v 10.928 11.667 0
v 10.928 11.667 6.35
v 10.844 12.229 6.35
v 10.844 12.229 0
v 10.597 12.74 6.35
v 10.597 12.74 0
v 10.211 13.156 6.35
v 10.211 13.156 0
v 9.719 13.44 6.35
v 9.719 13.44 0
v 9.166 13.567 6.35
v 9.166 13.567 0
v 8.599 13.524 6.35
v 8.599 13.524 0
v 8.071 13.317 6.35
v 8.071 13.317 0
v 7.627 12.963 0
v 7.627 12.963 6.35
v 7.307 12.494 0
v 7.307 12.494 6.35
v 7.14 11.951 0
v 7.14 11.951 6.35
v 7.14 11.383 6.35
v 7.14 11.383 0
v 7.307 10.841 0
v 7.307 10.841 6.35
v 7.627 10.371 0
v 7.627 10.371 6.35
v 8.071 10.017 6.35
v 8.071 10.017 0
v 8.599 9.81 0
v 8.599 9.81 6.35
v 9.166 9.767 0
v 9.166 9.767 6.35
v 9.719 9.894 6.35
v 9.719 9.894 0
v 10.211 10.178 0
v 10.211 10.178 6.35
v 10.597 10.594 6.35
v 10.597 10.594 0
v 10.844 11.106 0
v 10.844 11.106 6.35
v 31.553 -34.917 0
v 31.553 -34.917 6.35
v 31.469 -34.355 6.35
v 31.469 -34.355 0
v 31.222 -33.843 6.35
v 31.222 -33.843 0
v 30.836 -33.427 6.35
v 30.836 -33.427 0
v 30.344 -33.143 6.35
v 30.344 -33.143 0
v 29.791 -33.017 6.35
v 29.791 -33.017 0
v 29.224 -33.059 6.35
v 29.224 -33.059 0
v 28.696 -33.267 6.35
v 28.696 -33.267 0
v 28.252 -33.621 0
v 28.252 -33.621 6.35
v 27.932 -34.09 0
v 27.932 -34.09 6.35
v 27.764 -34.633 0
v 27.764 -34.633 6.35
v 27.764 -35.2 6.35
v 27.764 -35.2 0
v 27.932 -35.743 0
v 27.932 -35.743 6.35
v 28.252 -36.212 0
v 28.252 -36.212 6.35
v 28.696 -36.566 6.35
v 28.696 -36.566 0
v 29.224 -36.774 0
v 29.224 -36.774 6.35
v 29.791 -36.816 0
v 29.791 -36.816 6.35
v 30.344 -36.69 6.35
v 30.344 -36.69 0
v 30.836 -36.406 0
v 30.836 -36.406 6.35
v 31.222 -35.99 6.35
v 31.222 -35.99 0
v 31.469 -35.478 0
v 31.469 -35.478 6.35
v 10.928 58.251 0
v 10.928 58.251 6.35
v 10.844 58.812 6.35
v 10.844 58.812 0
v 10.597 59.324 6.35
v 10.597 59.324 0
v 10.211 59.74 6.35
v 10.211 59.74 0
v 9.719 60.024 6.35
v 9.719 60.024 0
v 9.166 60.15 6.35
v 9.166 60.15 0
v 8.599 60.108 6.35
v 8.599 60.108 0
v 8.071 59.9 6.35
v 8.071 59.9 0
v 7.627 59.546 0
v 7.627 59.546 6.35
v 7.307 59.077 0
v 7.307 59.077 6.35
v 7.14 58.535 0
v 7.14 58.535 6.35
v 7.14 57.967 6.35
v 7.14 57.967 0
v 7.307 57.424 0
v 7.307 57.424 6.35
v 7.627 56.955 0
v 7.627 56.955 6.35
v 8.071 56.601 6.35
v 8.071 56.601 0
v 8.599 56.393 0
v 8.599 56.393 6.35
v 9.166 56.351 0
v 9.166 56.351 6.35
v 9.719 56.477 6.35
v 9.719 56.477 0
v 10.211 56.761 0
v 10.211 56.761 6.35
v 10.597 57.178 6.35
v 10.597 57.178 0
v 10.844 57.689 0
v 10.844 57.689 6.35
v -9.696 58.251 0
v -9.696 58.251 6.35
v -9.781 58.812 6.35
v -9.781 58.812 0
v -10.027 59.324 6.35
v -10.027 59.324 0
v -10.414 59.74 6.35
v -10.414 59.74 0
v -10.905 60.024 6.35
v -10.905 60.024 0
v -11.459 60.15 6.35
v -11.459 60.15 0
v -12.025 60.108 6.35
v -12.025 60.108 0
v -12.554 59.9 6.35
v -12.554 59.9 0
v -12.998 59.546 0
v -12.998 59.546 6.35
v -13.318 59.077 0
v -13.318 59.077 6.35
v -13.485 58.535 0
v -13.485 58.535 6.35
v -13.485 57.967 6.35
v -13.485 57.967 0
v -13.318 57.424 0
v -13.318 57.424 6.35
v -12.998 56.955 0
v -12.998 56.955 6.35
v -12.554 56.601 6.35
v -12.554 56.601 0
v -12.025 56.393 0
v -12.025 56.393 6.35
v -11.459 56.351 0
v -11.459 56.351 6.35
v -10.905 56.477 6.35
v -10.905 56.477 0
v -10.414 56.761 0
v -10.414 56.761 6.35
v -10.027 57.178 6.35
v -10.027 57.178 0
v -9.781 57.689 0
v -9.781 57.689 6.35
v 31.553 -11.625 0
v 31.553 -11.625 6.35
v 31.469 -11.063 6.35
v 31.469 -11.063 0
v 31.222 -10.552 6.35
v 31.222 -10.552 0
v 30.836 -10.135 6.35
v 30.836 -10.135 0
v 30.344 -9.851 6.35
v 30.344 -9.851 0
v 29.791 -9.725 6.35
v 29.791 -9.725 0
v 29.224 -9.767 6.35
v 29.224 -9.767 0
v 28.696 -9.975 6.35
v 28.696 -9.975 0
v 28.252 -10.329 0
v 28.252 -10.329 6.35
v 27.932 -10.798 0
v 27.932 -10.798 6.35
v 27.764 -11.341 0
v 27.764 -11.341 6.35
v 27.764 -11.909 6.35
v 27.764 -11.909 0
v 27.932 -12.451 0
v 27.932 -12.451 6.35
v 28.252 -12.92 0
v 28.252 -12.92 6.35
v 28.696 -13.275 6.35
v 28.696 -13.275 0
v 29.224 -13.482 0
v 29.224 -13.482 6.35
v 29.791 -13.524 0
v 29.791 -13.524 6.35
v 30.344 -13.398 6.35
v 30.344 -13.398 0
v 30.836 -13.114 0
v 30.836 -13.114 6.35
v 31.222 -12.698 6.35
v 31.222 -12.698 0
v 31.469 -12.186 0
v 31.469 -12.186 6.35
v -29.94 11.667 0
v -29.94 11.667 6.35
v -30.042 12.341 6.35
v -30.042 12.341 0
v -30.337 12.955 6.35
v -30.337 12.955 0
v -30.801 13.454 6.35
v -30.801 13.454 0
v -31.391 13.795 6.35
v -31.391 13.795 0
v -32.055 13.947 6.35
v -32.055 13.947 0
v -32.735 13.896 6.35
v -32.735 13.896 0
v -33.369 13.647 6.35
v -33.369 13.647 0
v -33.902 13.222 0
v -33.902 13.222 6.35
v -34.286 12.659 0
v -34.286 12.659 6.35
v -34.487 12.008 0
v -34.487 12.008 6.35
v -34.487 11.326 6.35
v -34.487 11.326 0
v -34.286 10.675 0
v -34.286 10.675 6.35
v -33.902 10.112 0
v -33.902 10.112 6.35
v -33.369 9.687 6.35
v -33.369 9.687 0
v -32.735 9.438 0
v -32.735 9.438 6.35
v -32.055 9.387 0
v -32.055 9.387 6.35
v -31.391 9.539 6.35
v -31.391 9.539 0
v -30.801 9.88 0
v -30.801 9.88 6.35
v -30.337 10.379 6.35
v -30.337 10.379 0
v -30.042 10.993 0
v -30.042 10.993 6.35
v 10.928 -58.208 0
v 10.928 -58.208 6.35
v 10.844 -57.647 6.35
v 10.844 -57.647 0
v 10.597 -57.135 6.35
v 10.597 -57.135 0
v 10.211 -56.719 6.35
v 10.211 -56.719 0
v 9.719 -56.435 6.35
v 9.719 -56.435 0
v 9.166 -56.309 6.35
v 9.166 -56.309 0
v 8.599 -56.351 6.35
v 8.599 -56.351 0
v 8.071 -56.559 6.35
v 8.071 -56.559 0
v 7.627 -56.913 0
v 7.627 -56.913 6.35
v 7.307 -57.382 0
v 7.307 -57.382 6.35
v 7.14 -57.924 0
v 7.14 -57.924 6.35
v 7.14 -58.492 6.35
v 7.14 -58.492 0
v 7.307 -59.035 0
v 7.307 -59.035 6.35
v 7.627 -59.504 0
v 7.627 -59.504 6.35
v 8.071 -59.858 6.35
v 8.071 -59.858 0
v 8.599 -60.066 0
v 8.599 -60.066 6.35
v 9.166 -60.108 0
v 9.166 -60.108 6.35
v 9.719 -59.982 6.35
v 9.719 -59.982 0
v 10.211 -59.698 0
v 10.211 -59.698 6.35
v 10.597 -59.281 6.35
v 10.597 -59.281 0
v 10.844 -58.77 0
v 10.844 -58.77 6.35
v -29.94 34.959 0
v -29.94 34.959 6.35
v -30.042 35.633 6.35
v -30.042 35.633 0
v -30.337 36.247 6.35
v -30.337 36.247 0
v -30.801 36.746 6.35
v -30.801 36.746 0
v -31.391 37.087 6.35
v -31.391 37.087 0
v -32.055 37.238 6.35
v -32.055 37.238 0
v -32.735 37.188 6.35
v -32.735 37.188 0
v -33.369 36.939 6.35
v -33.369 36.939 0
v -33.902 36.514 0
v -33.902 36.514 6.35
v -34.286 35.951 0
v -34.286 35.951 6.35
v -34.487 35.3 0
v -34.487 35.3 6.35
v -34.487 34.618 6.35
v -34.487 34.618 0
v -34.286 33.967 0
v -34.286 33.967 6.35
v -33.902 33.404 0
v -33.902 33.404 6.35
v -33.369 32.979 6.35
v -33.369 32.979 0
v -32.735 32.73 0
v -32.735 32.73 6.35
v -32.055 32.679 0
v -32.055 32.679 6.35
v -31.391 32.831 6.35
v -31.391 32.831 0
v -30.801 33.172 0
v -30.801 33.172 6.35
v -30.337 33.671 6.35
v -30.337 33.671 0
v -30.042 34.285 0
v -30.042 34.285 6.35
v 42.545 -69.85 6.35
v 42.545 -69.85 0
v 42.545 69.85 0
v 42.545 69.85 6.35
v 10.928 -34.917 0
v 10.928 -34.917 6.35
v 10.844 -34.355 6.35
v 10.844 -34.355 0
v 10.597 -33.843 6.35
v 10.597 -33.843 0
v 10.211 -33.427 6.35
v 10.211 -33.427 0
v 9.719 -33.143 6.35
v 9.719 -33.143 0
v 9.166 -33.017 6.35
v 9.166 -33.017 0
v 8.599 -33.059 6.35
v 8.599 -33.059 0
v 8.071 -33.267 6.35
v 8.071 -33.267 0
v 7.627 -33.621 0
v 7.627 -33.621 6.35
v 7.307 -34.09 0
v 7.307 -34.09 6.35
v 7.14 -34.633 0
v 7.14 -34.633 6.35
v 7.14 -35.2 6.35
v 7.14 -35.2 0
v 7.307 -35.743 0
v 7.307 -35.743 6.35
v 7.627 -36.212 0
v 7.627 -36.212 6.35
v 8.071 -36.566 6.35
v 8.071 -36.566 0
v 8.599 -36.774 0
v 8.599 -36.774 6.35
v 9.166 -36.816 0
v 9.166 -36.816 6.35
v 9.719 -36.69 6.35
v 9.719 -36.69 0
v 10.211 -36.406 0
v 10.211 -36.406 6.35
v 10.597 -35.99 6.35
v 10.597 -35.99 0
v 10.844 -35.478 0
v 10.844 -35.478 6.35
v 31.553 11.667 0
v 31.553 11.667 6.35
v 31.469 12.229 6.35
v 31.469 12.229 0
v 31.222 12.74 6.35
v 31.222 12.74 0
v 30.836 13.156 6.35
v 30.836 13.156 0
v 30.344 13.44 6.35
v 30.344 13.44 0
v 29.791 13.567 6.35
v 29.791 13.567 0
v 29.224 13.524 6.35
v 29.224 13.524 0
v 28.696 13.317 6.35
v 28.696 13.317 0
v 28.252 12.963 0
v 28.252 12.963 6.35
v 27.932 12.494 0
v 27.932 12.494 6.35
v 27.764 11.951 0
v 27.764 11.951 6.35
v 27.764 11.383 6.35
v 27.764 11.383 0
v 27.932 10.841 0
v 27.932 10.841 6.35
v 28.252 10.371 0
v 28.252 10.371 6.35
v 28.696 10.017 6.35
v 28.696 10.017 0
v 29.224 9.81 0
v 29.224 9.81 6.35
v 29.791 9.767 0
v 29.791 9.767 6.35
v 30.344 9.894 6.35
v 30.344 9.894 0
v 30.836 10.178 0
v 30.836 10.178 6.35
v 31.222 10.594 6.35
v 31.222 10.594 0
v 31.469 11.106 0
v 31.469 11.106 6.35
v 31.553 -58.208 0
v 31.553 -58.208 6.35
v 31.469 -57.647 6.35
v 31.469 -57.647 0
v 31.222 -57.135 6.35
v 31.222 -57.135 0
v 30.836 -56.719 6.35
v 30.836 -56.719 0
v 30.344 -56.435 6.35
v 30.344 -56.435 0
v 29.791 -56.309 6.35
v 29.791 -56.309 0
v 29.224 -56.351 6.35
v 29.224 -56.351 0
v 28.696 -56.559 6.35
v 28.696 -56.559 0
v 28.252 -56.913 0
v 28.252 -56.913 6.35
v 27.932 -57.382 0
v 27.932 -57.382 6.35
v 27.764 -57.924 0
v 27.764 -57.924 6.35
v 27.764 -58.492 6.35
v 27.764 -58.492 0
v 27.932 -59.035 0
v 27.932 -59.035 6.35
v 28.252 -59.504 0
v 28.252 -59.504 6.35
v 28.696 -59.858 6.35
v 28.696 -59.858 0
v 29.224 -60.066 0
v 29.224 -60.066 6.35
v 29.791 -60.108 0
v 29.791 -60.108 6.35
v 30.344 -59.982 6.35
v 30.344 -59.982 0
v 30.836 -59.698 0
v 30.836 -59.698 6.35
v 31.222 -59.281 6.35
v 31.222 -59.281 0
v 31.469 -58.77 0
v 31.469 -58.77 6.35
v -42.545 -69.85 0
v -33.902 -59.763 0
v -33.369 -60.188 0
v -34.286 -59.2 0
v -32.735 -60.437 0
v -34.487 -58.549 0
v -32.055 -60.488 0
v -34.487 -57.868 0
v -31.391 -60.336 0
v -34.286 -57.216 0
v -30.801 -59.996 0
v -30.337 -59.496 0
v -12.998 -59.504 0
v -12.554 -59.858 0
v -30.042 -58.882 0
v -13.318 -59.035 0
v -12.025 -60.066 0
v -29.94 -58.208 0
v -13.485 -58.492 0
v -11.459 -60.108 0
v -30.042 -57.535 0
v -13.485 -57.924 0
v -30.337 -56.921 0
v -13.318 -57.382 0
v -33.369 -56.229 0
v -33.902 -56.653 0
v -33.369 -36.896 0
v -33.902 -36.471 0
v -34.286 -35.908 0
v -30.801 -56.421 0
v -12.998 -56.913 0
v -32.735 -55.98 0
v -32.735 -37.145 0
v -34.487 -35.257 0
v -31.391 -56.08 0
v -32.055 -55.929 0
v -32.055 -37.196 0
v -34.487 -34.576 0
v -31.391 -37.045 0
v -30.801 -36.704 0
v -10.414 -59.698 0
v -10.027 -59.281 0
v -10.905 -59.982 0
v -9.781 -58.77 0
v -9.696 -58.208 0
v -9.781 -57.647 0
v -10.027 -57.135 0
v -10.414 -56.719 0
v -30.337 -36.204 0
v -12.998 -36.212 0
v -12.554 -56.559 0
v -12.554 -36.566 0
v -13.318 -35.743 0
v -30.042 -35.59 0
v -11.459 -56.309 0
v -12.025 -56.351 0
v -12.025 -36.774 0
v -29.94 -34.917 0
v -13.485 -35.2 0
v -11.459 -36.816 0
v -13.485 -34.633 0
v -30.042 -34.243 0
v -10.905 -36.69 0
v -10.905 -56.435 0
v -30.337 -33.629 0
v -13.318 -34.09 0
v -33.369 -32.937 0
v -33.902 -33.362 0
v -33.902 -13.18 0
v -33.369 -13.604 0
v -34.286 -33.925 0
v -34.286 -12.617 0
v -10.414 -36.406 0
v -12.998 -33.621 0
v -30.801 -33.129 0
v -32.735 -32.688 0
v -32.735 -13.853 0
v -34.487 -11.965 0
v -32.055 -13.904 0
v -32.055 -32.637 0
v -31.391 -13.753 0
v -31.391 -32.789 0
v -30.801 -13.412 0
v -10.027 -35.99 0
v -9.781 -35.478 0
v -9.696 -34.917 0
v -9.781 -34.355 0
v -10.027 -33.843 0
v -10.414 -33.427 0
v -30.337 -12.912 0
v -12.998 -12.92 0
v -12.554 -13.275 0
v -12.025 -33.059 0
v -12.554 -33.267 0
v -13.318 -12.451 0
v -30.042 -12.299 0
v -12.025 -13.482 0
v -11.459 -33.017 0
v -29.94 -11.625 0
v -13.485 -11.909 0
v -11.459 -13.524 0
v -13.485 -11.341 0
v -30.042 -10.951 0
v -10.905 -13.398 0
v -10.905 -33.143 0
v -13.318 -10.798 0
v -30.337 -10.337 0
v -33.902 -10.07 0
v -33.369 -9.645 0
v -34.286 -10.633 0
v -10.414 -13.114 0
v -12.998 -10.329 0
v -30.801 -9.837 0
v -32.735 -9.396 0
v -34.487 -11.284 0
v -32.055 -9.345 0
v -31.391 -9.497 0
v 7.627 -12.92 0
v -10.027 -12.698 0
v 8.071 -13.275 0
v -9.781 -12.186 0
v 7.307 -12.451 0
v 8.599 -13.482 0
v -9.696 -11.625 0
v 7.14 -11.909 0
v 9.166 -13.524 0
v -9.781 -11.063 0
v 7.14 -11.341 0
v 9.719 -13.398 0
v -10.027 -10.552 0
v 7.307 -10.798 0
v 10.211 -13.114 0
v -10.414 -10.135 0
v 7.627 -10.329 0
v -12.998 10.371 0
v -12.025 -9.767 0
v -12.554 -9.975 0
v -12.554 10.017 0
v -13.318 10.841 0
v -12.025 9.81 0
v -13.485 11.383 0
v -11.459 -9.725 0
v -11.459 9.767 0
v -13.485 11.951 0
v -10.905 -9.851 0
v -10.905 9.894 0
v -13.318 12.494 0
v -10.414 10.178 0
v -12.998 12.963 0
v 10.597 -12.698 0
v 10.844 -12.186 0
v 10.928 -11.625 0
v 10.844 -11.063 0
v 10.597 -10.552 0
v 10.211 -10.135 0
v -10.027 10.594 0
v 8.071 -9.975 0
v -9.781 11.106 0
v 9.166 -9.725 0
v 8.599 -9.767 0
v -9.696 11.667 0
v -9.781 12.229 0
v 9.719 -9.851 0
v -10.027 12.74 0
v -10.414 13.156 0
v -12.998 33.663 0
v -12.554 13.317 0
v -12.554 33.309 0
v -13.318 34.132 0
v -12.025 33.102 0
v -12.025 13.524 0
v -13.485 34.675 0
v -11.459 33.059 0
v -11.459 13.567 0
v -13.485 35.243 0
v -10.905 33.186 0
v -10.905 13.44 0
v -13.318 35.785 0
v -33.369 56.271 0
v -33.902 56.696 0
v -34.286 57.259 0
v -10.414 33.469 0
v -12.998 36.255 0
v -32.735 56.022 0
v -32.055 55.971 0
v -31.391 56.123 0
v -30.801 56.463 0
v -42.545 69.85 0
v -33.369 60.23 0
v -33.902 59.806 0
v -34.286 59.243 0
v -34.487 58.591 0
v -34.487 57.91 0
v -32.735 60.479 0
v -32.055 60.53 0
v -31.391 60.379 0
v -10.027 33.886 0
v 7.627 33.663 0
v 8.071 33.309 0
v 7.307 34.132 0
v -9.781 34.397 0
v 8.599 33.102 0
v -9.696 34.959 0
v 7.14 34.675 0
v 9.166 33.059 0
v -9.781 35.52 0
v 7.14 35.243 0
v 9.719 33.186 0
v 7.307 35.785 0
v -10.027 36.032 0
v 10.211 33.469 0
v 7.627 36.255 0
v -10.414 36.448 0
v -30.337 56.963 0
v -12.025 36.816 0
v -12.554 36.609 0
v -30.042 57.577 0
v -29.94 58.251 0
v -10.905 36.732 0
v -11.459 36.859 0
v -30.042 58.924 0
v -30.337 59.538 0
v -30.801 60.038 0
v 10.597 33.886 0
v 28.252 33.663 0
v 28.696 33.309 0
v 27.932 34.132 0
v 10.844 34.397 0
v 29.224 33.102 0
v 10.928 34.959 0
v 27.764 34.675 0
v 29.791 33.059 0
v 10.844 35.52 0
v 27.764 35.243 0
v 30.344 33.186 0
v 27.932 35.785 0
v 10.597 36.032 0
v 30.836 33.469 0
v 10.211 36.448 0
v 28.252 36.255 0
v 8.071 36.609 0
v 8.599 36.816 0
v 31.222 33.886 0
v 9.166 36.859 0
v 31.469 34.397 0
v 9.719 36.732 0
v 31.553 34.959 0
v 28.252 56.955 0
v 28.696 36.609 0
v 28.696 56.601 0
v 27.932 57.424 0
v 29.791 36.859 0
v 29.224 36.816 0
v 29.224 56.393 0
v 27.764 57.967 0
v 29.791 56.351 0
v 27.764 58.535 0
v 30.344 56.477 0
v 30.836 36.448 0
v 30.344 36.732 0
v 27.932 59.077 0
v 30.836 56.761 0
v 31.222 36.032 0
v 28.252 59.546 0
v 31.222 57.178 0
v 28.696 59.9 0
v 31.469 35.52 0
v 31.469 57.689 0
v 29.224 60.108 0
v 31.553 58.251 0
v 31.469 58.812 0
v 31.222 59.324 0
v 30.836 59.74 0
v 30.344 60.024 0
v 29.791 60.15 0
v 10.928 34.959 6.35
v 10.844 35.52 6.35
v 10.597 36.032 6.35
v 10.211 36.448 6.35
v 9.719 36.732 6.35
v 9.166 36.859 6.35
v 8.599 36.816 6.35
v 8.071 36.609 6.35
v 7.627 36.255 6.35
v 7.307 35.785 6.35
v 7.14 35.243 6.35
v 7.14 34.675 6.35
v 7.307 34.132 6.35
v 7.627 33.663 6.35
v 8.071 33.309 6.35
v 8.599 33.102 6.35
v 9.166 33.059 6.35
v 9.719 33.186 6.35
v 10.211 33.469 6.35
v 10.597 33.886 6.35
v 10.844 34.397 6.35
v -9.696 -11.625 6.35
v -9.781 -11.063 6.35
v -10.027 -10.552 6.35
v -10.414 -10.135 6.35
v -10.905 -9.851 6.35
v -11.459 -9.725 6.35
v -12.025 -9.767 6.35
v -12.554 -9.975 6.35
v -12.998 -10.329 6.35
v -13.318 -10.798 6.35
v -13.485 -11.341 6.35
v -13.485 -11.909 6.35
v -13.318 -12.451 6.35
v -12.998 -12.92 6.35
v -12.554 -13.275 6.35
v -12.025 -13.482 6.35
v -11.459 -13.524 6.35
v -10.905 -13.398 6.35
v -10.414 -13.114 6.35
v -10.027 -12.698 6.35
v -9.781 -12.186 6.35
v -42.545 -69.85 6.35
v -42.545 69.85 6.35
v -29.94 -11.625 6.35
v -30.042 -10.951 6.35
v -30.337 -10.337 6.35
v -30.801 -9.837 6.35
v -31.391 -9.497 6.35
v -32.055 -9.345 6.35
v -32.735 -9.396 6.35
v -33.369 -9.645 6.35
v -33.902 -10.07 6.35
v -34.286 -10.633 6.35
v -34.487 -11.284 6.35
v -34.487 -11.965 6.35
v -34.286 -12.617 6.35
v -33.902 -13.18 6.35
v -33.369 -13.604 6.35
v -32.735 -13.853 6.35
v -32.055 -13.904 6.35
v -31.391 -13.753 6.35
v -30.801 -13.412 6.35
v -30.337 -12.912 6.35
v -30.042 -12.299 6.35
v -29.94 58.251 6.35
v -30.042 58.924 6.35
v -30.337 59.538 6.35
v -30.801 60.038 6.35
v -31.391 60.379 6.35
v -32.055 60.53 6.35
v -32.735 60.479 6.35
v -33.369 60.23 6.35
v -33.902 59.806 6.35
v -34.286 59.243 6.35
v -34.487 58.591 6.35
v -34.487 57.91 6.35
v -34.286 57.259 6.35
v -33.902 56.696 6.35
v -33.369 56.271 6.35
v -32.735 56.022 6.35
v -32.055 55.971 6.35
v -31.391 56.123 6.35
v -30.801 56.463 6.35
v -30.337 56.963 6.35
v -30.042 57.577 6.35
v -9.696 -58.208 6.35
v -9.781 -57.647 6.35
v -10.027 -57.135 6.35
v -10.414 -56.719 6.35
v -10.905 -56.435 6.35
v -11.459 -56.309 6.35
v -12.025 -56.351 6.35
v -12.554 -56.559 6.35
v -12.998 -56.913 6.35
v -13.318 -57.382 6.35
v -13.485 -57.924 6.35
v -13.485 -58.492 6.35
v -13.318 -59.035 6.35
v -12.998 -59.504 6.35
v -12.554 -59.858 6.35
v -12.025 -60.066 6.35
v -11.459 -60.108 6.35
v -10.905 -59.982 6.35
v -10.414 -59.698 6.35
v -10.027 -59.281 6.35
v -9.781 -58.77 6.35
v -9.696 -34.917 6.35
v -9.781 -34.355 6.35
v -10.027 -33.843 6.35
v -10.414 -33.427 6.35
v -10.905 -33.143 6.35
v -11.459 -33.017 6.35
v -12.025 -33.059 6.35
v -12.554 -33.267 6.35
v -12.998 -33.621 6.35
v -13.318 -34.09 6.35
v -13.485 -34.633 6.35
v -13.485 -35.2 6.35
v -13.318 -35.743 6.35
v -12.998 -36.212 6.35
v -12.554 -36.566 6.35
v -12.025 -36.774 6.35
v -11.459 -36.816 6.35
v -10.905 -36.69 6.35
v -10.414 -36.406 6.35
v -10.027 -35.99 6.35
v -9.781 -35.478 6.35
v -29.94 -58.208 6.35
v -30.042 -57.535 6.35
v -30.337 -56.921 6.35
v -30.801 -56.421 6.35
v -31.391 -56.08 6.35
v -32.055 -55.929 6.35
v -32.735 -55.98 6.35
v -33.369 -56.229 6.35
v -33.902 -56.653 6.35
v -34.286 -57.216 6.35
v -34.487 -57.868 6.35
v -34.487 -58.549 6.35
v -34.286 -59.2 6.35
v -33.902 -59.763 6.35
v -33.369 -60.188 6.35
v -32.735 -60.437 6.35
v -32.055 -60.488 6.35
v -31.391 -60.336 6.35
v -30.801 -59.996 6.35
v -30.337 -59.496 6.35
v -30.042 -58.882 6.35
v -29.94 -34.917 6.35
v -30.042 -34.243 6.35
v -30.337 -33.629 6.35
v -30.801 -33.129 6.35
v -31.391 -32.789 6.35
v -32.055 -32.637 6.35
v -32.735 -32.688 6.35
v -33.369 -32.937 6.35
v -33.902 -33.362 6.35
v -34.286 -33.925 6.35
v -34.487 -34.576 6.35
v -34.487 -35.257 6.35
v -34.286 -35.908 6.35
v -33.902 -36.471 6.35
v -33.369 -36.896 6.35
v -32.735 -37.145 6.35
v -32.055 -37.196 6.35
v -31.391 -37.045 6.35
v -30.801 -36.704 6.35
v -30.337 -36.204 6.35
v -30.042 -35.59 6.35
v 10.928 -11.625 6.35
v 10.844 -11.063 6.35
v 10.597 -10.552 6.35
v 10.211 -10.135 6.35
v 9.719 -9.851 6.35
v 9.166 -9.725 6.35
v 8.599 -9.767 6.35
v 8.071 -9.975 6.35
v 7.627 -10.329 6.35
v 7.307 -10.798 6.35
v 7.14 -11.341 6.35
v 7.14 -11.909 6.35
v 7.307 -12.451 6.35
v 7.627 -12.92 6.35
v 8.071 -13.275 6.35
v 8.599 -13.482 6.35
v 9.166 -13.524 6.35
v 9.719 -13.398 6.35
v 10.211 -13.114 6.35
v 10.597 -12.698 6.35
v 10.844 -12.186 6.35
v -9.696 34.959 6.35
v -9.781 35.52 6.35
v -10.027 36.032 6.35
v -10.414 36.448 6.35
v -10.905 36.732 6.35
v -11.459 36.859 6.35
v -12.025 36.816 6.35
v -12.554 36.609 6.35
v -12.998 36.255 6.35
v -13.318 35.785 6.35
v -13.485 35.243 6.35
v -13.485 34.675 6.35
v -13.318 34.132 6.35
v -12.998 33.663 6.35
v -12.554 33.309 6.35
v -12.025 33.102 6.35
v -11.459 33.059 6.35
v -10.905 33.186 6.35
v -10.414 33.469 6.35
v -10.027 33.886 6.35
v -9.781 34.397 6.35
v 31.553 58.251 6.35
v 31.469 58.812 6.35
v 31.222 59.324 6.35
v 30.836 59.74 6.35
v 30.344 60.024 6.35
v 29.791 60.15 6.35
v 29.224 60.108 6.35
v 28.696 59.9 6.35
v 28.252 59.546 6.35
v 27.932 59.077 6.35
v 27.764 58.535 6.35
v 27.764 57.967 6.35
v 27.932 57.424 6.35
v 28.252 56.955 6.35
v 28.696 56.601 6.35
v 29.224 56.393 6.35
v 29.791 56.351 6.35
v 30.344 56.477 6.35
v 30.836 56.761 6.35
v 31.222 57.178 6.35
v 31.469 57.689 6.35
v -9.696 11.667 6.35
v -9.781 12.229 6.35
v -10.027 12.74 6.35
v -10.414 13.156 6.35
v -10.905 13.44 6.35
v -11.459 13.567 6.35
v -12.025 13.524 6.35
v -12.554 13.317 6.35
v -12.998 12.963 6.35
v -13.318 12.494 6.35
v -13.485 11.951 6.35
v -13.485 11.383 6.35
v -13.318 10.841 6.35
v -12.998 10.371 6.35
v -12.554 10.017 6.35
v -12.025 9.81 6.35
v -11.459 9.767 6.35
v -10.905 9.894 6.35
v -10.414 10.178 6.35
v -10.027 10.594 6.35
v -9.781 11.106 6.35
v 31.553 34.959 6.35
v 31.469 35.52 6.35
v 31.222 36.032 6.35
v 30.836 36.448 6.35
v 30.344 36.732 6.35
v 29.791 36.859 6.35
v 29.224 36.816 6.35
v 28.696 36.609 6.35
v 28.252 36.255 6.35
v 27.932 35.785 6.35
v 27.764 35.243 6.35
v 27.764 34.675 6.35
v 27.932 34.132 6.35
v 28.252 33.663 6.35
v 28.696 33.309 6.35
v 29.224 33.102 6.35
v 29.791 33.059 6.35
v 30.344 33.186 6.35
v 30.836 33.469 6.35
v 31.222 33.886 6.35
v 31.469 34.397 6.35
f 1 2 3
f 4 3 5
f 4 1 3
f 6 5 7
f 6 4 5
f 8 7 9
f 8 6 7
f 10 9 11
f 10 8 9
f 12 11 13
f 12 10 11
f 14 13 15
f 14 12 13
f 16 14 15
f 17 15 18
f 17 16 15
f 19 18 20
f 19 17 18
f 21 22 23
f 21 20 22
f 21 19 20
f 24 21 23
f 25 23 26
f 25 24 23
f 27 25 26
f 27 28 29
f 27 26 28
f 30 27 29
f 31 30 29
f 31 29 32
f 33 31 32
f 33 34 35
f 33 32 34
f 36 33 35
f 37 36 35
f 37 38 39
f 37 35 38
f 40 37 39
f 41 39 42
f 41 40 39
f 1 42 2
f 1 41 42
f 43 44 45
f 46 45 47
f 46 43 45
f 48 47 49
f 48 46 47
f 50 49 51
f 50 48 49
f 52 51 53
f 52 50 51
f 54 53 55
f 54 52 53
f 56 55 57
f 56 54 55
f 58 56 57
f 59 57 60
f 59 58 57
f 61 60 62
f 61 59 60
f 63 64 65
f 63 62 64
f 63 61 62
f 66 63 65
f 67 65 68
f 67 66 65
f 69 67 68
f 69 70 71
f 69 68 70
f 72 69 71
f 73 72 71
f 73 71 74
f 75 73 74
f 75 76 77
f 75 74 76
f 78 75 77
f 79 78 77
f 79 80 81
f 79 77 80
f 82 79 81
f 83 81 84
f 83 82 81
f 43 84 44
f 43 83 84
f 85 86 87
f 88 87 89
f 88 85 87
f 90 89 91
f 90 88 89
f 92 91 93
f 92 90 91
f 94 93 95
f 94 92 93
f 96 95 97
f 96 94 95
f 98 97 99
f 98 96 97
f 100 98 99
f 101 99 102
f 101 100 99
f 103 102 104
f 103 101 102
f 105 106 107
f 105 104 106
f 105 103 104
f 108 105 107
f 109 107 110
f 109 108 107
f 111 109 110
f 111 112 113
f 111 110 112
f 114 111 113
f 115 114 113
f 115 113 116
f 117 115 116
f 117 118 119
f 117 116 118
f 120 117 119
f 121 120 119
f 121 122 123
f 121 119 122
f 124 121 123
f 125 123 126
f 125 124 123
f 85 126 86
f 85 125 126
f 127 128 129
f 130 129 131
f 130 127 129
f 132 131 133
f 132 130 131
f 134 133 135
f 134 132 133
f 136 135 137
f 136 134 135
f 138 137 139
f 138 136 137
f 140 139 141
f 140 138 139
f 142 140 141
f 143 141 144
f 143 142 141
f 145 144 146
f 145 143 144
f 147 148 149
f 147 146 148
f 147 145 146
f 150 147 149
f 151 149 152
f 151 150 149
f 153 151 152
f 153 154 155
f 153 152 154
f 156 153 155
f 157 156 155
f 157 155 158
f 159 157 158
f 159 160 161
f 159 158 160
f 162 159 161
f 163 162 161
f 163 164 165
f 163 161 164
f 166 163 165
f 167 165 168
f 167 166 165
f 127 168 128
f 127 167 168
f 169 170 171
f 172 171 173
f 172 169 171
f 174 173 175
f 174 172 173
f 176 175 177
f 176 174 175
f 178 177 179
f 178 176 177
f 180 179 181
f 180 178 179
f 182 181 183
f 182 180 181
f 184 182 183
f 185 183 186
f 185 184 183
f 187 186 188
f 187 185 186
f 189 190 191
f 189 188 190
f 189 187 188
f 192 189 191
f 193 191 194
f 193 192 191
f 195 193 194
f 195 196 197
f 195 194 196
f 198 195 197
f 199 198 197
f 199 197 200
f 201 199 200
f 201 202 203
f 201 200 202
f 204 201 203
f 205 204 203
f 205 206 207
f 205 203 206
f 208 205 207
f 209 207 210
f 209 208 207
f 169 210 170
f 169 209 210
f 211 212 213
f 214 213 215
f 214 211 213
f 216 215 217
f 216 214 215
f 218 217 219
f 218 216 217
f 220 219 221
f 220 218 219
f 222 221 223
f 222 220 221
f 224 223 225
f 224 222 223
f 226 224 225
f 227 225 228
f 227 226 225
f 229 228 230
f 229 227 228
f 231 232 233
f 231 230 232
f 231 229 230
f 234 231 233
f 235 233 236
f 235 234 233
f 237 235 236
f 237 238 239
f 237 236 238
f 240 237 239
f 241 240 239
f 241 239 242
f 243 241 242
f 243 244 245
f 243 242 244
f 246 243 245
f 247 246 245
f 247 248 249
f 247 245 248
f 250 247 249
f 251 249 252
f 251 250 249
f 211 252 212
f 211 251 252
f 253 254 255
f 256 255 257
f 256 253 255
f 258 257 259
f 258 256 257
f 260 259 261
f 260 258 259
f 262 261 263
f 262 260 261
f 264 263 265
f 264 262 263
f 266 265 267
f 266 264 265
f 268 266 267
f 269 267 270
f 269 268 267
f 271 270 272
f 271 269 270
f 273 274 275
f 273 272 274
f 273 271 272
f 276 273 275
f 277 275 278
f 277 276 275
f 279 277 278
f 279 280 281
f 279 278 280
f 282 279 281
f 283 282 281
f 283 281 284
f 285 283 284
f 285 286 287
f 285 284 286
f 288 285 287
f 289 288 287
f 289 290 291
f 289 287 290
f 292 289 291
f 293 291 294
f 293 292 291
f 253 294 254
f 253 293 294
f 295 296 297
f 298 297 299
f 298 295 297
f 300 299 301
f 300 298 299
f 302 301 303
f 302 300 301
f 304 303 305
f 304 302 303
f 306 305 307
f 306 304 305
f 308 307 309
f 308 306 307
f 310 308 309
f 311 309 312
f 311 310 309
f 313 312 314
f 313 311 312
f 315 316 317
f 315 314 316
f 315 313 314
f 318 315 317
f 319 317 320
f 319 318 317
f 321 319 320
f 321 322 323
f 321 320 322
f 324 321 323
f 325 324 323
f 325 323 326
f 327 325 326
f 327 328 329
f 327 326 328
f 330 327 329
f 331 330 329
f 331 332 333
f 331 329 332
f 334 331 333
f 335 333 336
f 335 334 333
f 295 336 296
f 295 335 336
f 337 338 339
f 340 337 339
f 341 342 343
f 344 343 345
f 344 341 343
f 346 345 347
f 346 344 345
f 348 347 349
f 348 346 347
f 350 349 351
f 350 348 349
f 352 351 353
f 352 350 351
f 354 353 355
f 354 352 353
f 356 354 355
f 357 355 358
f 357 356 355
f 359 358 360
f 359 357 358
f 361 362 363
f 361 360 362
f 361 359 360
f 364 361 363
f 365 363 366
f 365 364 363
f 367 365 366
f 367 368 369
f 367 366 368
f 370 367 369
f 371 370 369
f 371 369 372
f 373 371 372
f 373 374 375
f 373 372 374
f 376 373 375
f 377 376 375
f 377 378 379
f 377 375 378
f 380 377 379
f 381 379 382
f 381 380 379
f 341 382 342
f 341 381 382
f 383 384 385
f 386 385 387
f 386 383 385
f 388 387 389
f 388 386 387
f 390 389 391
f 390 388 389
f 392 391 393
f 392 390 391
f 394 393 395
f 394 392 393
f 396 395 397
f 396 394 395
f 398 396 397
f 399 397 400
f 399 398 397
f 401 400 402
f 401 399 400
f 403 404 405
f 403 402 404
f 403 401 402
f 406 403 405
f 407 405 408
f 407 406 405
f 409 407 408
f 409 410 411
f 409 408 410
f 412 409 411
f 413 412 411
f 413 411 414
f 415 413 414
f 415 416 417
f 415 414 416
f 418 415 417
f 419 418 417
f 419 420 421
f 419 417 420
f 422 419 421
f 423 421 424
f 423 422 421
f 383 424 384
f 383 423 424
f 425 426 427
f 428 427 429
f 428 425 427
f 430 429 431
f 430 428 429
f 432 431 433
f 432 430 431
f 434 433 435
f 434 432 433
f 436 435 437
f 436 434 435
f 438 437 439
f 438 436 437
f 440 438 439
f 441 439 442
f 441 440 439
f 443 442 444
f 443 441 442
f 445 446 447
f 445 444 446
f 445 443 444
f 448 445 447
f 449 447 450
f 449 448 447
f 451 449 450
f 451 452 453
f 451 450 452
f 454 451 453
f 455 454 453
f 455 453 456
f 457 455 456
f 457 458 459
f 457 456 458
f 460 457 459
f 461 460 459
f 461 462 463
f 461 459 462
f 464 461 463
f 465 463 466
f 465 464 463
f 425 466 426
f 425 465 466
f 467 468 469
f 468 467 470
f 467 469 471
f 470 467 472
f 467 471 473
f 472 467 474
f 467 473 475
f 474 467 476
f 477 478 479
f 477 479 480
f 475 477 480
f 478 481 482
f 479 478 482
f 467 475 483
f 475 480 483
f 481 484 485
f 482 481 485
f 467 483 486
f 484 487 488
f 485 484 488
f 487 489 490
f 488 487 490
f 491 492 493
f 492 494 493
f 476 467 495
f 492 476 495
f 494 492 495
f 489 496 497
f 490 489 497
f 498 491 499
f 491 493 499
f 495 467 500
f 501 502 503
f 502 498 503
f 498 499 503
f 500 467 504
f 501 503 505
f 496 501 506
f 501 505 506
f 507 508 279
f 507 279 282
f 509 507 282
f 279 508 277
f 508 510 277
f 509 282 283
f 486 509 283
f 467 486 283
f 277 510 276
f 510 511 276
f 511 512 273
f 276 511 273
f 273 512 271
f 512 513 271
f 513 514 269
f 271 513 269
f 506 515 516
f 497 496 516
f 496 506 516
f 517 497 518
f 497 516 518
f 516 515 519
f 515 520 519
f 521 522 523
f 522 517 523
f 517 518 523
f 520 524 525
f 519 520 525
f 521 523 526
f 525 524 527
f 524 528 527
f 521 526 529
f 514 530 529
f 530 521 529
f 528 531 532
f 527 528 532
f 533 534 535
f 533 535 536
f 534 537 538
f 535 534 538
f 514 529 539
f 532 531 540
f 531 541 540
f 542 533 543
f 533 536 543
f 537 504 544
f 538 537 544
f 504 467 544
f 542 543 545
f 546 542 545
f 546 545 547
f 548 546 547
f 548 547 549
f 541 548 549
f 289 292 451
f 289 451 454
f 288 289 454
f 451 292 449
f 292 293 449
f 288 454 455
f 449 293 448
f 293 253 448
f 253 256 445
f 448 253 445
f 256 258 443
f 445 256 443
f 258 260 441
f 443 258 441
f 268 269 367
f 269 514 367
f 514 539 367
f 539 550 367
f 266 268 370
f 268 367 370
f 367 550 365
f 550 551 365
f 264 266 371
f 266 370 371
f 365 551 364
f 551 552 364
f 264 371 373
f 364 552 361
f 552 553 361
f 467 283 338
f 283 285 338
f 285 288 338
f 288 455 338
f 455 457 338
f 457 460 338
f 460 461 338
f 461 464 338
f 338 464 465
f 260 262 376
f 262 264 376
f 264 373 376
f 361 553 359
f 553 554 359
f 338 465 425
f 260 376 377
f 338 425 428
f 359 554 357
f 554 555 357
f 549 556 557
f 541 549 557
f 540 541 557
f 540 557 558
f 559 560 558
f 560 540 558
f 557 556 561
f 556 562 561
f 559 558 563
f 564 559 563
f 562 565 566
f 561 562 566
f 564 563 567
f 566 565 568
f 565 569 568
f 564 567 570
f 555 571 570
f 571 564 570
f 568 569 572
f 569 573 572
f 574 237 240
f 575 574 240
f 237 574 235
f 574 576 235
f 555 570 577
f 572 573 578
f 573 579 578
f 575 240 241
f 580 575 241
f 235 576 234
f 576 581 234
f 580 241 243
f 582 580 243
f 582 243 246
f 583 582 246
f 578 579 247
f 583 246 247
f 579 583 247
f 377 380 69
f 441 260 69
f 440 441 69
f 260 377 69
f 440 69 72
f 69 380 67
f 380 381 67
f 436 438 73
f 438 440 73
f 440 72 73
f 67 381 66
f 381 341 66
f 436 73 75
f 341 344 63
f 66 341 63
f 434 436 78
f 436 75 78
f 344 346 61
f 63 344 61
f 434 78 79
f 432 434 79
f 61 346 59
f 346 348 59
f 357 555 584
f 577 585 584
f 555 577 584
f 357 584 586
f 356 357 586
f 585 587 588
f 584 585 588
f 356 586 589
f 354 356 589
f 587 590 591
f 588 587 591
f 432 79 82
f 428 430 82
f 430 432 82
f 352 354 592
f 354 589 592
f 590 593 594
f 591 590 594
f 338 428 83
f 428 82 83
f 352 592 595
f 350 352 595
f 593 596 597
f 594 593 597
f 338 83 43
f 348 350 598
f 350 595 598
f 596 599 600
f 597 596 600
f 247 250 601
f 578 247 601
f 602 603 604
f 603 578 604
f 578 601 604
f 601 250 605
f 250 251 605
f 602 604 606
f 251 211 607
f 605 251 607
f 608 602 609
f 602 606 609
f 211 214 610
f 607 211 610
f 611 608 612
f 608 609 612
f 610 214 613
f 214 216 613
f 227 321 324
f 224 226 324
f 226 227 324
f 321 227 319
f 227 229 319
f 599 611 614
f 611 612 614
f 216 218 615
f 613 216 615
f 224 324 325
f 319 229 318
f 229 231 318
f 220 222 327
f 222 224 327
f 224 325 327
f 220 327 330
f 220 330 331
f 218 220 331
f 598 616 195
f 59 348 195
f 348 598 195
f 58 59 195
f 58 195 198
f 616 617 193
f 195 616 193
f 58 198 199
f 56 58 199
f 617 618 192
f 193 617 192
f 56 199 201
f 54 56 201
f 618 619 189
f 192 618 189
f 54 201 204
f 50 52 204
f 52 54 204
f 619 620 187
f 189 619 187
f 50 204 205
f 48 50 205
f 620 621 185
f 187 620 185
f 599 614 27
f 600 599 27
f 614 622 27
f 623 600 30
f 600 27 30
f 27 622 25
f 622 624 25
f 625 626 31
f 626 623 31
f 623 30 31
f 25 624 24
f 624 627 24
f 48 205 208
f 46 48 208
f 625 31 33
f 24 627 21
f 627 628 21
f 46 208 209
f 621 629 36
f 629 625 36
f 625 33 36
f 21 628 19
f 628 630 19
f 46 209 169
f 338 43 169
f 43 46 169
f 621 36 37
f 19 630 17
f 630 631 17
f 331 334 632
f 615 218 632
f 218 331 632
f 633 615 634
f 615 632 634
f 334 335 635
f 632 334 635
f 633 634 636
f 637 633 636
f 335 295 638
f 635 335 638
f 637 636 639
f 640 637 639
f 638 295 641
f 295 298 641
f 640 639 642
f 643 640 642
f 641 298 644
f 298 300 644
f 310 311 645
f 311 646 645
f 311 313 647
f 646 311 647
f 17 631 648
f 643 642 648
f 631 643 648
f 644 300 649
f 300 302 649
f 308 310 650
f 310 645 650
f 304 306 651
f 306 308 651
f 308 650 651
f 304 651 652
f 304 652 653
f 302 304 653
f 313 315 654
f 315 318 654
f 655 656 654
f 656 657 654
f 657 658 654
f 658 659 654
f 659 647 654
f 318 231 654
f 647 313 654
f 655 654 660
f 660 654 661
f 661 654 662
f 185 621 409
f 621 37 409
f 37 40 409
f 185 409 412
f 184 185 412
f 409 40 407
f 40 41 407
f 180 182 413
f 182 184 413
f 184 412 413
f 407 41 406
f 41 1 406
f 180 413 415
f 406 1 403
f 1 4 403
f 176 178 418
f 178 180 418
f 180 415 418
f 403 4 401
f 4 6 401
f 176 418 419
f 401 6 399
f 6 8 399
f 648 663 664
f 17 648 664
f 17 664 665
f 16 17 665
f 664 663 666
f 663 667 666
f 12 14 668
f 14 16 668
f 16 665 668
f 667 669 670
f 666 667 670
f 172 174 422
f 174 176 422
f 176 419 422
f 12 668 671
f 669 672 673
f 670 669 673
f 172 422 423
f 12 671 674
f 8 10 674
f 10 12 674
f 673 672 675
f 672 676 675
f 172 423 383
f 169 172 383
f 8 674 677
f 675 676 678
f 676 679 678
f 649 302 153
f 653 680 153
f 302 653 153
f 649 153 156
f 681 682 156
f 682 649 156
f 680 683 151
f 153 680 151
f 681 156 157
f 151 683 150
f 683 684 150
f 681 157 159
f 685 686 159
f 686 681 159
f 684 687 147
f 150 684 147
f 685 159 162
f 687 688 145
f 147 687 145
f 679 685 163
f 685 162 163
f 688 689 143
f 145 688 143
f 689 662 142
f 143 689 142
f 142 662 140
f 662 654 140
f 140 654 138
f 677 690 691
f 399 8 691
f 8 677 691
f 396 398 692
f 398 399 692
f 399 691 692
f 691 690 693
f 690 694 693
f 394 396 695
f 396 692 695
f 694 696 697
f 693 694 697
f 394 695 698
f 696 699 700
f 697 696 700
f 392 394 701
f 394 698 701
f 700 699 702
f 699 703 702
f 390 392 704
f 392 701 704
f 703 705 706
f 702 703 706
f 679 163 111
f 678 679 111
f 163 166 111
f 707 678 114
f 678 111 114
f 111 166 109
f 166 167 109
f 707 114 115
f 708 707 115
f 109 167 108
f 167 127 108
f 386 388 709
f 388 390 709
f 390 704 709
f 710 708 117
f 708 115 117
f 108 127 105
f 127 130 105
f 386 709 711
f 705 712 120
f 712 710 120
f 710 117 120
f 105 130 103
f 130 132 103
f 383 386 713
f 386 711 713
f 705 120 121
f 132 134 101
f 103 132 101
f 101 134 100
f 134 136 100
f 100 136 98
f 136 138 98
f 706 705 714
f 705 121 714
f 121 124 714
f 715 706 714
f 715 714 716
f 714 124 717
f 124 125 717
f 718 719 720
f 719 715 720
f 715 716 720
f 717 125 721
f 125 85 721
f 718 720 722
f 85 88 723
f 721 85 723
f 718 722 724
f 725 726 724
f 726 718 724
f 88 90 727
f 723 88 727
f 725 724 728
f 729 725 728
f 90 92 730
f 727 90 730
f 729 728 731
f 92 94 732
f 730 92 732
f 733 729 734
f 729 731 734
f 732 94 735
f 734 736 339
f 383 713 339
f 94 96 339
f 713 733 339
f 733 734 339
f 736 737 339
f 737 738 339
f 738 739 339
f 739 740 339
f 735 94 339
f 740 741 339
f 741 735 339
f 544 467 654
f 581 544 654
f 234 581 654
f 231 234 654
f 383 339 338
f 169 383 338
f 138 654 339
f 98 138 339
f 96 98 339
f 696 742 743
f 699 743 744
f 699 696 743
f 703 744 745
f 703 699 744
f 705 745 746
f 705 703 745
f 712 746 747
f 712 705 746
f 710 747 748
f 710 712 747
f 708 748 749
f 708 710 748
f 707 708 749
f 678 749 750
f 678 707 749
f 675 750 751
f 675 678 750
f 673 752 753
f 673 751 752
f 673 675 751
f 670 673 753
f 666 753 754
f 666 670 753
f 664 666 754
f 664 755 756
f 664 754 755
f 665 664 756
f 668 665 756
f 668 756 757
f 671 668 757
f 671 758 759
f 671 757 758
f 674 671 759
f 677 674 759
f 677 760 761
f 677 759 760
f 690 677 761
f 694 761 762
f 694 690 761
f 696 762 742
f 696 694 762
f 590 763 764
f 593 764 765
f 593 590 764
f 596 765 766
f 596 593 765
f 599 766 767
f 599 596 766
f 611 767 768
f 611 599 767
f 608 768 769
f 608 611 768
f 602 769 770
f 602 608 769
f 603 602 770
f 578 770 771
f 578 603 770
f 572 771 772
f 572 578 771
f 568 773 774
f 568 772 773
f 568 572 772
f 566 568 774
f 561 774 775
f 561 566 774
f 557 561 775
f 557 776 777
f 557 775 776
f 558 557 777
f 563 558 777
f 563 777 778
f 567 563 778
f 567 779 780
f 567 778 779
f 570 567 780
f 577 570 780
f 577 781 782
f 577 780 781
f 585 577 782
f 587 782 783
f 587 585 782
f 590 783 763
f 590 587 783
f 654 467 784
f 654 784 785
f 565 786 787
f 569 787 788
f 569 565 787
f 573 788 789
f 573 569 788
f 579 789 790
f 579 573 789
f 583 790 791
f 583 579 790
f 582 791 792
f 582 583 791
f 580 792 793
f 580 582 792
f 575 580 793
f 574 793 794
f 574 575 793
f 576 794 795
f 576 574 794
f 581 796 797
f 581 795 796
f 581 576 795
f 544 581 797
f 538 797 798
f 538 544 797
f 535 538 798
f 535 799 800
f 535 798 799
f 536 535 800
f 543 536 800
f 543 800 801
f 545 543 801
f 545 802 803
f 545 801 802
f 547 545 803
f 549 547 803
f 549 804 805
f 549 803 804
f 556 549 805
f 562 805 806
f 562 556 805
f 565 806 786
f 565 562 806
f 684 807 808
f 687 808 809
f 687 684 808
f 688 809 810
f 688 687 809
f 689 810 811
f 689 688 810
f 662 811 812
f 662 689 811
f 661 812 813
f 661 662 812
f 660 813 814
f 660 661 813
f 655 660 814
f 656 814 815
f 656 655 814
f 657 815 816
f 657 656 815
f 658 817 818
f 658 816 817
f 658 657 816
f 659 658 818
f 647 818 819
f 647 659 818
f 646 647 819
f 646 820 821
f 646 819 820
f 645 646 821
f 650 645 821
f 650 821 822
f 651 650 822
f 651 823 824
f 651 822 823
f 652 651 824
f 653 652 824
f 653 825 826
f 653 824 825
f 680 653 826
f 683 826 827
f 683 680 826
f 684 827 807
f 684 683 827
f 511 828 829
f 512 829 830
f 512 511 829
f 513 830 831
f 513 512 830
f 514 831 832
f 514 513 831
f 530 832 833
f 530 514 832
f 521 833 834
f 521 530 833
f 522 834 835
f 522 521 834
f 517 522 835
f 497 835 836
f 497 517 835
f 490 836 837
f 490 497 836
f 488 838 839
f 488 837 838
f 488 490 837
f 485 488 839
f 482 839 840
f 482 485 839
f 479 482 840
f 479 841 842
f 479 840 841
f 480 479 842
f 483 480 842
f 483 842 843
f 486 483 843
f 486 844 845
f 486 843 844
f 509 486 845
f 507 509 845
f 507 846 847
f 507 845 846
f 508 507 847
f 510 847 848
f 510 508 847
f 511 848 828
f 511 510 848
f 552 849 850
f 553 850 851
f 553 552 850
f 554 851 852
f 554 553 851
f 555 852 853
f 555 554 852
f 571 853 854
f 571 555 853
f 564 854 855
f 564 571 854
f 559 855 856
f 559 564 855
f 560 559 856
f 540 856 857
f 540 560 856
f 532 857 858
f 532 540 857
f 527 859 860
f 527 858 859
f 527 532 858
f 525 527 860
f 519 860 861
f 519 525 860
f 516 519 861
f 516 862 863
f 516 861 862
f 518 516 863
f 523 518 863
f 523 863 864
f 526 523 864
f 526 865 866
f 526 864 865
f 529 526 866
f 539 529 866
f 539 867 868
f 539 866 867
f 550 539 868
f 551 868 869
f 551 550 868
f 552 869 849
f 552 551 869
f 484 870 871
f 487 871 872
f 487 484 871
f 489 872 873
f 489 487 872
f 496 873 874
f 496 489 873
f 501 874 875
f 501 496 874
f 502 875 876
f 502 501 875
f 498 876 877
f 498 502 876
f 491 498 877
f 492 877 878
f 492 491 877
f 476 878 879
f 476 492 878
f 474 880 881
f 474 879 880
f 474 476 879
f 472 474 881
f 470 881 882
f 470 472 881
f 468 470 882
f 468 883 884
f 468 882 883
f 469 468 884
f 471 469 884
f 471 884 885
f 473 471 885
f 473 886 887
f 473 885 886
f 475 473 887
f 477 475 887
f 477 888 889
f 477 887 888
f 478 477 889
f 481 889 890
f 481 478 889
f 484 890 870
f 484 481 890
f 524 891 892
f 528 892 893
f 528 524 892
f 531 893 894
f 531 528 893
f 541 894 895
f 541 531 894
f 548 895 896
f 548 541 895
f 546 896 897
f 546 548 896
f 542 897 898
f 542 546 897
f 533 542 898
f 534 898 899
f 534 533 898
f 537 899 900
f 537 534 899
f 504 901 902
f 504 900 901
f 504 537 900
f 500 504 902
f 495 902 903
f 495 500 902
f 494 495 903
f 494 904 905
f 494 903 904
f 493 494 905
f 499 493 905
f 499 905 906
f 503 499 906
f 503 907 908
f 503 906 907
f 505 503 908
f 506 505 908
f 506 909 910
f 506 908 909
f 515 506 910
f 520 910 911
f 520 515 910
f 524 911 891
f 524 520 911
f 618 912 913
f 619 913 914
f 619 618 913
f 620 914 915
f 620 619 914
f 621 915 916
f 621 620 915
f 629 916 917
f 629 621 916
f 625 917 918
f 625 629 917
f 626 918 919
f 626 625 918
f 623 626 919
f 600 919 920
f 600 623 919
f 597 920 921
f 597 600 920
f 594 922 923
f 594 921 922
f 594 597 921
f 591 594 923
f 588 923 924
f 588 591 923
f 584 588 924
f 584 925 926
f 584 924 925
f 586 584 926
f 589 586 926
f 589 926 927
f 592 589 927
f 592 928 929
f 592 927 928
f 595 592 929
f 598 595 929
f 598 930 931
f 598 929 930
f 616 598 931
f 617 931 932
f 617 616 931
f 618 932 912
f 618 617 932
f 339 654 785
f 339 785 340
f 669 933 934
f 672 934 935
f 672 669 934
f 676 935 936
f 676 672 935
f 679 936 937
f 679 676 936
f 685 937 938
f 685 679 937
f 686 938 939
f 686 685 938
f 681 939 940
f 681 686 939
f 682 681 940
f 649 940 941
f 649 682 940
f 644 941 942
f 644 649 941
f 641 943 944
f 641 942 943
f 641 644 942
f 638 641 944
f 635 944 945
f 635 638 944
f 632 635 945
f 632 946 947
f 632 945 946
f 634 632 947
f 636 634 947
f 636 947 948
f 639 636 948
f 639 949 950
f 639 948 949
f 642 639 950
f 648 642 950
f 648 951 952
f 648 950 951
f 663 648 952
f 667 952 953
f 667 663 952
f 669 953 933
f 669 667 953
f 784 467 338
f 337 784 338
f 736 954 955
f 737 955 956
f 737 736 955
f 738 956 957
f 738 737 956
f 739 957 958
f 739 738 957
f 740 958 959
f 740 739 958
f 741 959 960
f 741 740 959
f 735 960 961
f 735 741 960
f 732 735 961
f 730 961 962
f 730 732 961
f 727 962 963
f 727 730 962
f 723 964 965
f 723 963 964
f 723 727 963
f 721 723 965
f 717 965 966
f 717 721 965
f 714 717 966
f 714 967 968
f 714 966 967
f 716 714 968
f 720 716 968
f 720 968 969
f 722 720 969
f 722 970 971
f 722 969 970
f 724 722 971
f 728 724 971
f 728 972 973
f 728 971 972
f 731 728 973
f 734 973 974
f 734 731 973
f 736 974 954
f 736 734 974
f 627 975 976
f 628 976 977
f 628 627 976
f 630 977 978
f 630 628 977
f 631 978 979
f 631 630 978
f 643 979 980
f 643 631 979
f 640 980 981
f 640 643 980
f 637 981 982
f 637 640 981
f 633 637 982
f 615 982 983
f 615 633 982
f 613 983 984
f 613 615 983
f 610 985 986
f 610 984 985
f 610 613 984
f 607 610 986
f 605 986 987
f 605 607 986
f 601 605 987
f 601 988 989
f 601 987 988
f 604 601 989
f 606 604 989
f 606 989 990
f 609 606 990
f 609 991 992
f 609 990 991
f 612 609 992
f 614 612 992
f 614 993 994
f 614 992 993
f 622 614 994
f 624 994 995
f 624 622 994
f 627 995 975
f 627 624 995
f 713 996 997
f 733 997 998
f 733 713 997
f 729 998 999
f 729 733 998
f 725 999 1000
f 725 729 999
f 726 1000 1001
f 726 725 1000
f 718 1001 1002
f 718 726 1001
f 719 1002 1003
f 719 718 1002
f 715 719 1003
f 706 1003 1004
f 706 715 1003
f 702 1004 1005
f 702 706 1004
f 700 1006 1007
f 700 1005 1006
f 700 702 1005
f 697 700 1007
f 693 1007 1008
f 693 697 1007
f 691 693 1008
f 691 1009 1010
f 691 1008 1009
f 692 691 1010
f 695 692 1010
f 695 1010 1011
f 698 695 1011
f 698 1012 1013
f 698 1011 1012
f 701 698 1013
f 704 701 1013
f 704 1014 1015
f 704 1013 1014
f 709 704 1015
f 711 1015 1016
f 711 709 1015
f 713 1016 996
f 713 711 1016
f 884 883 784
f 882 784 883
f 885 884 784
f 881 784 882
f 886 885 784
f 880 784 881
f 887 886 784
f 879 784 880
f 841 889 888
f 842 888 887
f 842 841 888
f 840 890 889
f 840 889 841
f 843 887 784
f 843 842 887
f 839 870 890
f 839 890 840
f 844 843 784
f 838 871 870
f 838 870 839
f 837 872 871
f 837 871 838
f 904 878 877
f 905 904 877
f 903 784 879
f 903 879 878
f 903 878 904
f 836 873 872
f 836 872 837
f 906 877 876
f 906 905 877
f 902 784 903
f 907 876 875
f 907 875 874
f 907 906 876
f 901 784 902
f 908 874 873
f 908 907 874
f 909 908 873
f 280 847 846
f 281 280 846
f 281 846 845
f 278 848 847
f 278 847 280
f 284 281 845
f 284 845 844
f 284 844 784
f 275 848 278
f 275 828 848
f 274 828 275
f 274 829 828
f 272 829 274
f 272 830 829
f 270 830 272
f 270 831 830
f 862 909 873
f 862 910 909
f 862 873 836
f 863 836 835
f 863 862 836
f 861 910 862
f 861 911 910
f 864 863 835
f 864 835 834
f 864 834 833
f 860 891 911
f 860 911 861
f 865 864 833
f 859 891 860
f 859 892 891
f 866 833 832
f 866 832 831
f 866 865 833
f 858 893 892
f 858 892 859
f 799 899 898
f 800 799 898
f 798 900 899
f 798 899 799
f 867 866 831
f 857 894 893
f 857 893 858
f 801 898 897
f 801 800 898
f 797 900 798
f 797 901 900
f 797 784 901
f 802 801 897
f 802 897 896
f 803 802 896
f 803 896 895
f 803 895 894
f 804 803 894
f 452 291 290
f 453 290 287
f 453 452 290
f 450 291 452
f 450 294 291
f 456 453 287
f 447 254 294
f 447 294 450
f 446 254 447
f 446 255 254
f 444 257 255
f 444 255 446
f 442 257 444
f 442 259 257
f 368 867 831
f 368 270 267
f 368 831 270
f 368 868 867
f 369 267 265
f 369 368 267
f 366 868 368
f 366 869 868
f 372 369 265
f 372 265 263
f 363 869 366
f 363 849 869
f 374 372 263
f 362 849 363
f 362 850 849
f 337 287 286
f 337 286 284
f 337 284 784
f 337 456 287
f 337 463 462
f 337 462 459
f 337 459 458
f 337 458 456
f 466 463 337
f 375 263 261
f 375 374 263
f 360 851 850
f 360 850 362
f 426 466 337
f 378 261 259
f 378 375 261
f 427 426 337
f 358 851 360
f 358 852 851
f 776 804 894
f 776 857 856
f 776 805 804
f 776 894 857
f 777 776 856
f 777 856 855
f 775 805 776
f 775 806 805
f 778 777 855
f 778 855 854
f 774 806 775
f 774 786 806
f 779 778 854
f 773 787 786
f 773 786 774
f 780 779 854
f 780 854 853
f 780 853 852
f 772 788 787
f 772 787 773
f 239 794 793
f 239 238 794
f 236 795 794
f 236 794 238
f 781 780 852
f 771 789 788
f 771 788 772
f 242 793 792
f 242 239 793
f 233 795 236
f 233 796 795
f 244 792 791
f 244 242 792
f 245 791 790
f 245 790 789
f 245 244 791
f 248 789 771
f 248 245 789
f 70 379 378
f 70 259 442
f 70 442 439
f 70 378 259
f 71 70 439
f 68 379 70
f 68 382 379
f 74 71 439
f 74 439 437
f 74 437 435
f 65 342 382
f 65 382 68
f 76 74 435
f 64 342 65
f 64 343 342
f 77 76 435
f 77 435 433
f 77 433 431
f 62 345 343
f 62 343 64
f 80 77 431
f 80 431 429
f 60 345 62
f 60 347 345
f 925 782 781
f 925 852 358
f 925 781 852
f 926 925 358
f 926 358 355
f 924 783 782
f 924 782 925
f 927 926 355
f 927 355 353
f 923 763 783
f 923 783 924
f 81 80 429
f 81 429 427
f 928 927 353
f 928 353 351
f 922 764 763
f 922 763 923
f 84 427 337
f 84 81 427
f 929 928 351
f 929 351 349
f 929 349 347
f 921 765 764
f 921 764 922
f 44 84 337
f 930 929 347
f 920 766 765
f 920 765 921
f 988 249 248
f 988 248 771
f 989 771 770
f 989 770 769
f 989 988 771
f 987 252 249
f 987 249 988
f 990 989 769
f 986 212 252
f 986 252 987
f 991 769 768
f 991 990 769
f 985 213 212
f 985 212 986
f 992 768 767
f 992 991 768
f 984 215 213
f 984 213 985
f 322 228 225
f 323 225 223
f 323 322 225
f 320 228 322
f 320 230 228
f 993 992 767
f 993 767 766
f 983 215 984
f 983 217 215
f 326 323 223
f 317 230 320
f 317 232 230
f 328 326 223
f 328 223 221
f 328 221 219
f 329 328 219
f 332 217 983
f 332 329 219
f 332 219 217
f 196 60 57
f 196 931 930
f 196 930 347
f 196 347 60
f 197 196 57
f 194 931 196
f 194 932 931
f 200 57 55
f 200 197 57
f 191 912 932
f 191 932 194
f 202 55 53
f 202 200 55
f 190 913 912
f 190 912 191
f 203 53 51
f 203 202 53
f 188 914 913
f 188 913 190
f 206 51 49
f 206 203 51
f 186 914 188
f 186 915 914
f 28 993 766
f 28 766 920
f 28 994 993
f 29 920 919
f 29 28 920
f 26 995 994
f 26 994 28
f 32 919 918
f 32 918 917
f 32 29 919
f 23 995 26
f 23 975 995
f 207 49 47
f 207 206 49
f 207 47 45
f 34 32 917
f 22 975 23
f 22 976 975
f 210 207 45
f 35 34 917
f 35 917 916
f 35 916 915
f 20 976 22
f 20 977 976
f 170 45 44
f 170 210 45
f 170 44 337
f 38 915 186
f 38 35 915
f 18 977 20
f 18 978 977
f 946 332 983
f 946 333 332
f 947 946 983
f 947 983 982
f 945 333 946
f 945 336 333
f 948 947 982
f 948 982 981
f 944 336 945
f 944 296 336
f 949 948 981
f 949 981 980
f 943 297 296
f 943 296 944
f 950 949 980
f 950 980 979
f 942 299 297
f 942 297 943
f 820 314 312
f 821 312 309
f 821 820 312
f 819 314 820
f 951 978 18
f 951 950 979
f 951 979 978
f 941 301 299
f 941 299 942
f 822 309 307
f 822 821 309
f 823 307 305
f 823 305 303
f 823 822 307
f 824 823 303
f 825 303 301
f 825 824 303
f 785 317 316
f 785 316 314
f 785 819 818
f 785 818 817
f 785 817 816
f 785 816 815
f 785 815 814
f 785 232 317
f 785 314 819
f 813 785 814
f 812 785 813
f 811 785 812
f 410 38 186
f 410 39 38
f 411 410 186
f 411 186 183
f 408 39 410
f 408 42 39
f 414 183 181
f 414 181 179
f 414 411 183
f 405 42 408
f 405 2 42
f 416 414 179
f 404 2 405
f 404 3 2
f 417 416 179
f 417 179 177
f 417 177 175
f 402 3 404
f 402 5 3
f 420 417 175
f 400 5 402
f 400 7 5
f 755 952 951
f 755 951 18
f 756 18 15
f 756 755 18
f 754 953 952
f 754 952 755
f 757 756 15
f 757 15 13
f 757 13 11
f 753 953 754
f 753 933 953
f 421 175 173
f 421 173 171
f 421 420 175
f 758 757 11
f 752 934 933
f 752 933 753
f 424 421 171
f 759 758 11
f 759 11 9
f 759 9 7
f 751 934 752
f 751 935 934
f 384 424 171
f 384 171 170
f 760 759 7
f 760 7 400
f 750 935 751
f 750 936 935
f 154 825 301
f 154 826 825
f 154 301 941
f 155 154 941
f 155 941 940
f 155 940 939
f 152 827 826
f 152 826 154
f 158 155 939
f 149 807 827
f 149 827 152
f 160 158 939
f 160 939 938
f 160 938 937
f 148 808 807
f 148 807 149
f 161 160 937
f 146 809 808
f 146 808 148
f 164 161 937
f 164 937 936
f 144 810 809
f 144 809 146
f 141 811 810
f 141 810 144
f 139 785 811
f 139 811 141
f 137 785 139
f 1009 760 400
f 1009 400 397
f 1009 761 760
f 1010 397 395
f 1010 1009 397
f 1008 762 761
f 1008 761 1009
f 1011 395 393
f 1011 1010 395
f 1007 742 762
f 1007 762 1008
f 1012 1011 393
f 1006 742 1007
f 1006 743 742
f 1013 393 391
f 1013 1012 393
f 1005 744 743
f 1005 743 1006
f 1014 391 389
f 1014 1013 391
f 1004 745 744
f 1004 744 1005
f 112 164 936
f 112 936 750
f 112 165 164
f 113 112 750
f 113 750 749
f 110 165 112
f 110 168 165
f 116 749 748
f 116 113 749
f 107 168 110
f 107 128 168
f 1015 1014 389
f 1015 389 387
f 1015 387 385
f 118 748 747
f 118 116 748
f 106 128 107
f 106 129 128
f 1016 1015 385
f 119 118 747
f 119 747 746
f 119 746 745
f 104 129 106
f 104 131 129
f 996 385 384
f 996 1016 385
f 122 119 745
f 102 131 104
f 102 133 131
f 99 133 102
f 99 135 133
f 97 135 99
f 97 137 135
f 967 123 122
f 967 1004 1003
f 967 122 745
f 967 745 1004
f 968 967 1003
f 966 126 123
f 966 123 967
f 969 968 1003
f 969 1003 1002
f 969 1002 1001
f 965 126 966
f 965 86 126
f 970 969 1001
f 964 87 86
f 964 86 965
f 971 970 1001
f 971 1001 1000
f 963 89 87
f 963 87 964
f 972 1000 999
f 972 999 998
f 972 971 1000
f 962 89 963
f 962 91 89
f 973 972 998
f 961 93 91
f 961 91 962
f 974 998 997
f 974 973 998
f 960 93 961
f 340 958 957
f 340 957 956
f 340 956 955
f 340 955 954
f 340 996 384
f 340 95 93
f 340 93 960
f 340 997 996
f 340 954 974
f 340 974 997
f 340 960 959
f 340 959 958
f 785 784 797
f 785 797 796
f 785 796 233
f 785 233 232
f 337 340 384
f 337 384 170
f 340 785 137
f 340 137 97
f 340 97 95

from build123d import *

# Parameters (mm, degrees)
F0_W     = 85.09
F0_H     = 139.7
F1_DEPTH = 6.35
F2_R     = 1.905
F3_DEPTH = 6.351
F4_R     = 2.286
F5_DEPTH = 6.351


with BuildPart() as f1:
    # F0 (on Top) → F1 (new body)
    with BuildSketch(Plane.XY):
        Rectangle(F0_W, F0_H)
    extrude(amount=F1_DEPTH)

    # F2 (on Top) → F3 (cut, through all)
    with BuildSketch(Plane.XY):
        with Locations((-32.22625, -58.208333)):
            Circle(F2_R)
        with Locations((-32.22625, -34.916533)):
            Circle(F2_R)
        with Locations((-32.22625, -11.624733)):
            Circle(F2_R)
        with Locations((-32.22625, 11.667067)):
            Circle(F2_R)
        with Locations((-32.22625, 34.958867)):
            Circle(F2_R)
        with Locations((-32.22625, 58.250667)):
            Circle(F2_R)
        with Locations((-11.60145, -58.208333)):
            Circle(F2_R)
        with Locations((-11.60145, -34.916533)):
            Circle(F2_R)
        with Locations((-11.60145, -11.624733)):
            Circle(F2_R)
        with Locations((-11.60145, 11.667067)):
            Circle(F2_R)
        with Locations((-11.60145, 34.958867)):
            Circle(F2_R)
        with Locations((-11.60145, 58.250667)):
            Circle(F2_R)
        with Locations((9.02335, -58.208333)):
            Circle(F2_R)
        with Locations((9.02335, -34.916533)):
            Circle(F2_R)
        with Locations((9.02335, -11.624733)):
            Circle(F2_R)
        with Locations((9.02335, 11.667067)):
            Circle(F2_R)
        with Locations((9.02335, 34.958867)):
            Circle(F2_R)
        with Locations((9.02335, 58.250667)):
            Circle(F2_R)
        with Locations((29.64815, -58.208333)):
            Circle(F2_R)
        with Locations((29.64815, -34.916533)):
            Circle(F2_R)
        with Locations((29.64815, -11.624733)):
            Circle(F2_R)
        with Locations((29.64815, 11.667067)):
            Circle(F2_R)
        with Locations((29.64815, 34.958867)):
            Circle(F2_R)
        with Locations((29.64815, 58.250667)):
            Circle(F2_R)
    extrude(amount=F3_DEPTH, mode=Mode.SUBTRACT)

    # F4 (on Top) → F5 (cut, through all)
    with BuildSketch(Plane.XY):
        with Locations((-32.22625, -58.208333)):
            Circle(F4_R)
        with Locations((-32.22625, -34.916533)):
            Circle(F4_R)
        with Locations((-32.22625, -11.624733)):
            Circle(F4_R)
        with Locations((-32.22625, 11.667067)):
            Circle(F4_R)
        with Locations((-32.22625, 34.958867)):
            Circle(F4_R)
        with Locations((-32.22625, 58.250667)):
            Circle(F4_R)
    extrude(amount=F5_DEPTH, mode=Mode.SUBTRACT)


solid = f1.part
